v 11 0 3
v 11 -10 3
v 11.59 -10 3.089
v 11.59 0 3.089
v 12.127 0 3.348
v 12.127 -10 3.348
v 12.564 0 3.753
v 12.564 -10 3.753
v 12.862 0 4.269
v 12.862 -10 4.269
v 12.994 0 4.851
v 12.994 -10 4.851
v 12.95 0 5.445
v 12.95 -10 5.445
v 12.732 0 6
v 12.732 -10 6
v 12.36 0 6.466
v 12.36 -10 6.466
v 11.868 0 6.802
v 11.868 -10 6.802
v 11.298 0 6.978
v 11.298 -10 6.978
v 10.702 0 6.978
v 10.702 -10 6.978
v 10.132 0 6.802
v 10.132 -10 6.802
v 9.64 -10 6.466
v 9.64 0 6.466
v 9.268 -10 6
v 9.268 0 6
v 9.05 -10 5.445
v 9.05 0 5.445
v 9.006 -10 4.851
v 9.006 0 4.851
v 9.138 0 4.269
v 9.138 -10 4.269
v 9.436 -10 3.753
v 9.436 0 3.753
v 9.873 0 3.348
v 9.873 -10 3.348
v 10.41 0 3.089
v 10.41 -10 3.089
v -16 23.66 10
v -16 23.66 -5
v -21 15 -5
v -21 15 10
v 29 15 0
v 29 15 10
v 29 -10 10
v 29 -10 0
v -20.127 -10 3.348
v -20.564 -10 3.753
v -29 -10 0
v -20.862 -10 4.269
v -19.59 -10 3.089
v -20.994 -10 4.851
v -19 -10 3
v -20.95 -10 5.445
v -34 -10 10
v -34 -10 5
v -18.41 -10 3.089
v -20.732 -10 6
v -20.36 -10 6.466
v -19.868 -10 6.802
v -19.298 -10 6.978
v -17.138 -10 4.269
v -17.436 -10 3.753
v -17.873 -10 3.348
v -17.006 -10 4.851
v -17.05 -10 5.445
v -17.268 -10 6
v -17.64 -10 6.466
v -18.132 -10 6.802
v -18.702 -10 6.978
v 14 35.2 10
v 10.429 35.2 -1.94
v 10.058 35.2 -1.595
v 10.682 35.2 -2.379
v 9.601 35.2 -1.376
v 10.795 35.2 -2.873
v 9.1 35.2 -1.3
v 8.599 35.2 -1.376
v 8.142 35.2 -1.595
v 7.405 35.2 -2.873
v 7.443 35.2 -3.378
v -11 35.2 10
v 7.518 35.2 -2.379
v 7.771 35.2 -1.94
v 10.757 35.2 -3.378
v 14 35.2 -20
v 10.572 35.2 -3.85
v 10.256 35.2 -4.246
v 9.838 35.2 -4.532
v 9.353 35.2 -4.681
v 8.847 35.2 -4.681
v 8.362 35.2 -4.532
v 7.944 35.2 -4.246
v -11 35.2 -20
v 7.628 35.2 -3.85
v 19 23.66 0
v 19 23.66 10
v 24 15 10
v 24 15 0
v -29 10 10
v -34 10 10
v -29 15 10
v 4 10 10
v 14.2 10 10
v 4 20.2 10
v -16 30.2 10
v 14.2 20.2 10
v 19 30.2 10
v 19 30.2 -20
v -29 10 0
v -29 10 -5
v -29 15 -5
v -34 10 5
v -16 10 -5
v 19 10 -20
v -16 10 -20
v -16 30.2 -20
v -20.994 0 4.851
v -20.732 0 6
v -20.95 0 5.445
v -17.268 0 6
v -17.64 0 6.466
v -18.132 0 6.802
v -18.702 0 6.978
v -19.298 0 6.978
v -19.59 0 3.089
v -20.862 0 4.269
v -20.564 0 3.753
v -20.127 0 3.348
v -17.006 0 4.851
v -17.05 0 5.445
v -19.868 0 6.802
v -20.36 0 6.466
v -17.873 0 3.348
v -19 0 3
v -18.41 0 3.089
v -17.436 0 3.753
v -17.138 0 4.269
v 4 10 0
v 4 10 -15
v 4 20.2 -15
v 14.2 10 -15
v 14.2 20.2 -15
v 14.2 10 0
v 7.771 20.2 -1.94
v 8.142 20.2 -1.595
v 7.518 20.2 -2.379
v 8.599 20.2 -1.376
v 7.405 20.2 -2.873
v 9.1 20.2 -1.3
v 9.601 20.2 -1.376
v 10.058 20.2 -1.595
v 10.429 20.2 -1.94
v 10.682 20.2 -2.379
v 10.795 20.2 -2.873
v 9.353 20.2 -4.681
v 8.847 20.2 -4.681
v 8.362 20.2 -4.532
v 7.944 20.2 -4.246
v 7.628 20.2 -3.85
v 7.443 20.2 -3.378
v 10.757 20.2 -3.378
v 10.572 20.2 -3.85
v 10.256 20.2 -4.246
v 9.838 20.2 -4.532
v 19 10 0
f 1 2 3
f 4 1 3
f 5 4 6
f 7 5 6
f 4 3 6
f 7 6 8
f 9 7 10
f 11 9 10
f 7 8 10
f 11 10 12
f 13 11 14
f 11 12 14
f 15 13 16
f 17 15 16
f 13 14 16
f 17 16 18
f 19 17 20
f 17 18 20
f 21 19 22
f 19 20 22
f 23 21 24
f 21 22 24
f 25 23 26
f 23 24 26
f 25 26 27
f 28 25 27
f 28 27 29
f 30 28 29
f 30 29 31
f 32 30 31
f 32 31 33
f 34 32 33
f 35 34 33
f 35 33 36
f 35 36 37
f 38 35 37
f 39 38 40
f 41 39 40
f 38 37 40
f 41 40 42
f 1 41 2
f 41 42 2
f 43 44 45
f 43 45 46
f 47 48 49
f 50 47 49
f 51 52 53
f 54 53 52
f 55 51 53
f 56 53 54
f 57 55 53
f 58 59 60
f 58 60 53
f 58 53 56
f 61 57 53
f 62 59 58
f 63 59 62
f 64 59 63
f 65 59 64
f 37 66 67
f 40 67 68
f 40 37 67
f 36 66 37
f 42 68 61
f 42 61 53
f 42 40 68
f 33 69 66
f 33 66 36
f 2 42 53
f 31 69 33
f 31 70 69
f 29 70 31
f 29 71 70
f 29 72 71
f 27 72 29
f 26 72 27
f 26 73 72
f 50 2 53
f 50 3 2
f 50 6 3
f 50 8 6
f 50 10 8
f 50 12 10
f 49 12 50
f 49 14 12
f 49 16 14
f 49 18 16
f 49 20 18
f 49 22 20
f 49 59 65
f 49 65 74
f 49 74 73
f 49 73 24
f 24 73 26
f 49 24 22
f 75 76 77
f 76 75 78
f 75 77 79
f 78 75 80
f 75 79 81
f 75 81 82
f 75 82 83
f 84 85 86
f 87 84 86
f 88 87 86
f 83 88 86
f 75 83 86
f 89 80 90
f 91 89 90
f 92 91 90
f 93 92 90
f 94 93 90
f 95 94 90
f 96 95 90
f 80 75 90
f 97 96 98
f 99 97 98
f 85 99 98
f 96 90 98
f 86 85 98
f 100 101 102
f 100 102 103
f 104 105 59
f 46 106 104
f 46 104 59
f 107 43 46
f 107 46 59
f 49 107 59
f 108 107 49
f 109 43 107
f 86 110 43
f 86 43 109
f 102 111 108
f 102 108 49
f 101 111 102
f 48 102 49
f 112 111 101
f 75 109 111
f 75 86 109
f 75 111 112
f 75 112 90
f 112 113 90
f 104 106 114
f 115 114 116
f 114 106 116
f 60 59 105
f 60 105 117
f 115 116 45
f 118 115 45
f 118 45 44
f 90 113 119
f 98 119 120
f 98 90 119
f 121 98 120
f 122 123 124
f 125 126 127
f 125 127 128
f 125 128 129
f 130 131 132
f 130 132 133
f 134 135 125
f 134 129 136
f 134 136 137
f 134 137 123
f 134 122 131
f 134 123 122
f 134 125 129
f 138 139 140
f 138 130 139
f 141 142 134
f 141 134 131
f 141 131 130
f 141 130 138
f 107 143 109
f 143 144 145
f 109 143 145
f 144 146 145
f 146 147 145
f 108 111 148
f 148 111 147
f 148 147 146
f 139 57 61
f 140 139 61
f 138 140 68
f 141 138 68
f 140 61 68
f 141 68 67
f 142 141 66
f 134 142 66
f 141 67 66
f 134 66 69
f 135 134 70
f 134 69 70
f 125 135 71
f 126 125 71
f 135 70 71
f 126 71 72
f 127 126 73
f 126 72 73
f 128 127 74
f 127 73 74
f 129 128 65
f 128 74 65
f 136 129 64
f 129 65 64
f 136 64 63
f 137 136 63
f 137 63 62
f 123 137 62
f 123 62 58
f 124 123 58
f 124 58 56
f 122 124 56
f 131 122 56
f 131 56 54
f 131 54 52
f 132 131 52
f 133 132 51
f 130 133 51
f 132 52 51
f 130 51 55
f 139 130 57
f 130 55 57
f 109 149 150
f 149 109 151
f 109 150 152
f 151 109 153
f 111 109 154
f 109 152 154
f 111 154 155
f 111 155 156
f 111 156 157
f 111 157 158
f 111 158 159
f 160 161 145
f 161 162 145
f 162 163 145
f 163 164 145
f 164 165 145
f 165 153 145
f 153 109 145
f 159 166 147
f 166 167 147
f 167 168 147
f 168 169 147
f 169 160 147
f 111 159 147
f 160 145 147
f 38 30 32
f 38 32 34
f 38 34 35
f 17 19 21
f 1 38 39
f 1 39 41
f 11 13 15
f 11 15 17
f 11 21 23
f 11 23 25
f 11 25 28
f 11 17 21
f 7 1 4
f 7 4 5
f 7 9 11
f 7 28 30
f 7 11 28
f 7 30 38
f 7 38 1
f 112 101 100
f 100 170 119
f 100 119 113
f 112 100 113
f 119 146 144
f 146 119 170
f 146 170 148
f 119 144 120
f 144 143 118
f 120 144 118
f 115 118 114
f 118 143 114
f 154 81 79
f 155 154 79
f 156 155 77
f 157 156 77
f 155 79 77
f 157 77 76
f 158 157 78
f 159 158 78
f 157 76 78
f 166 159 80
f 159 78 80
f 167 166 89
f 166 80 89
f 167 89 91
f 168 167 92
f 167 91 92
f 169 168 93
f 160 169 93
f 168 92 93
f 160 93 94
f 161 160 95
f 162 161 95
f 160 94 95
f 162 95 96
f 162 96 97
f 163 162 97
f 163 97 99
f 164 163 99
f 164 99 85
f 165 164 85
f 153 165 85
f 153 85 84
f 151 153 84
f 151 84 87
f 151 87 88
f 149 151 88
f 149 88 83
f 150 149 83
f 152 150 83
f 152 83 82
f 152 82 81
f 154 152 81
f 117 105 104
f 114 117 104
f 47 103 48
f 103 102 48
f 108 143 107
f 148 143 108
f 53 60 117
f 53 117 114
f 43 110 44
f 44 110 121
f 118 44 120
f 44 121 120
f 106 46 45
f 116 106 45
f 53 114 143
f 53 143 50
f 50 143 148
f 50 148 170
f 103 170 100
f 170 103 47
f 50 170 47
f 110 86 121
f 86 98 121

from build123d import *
from OCP.BRepFilletAPI import BRepFilletAPI_MakeChamfer

# Parameters (mm, degrees)
SZKIC1_W                        = 58
SZKIC1_H                        = 20
DODANIE_WYCI_GNI_CIE1_DEPTH     = 5
SZKIC2_W                        = 15
SZKIC2_H                        = 5
DODANIE_WYCI_GNI_CIE2_DEPTH     = 58
DODANIE_WYCI_GNI_CIE3_DEPTH     = 20
DODANIE_WYCI_GNI_CIE4_DEPTH     = 10
WYTNIJ_WYCI_GNI_CIE2_DEPTH      = 50.950375374
WYTNIJ_WYCI_GNI_CIE2_DEPTH_BACK = 50.950375374
SZKIC6_W                        = 58
SZKIC6_H                        = 5
DODANIE_WYCI_GNI_CIE5_DEPTH     = 20
SZKIC7_R                        = 2
WYTNIJ_WYCI_GNI_CIE3_DEPTH      = 10
DODANIE_WYCI_GNI_CIE8_DEPTH     = 10
SZKIC11_W                       = 10.2
SZKIC11_H                       = 10.2
DODANIE_WYCI_GNI_CIE9_DEPTH     = 5
SFAZOWANIE2_SIZE                = 5
SZKIC12_W                       = 10
SZKIC12_H                       = 20
WYTNIJ_WYCI_GNI_CIE4_DEPTH      = 10
SZKIC13_R                       = 1.7
WYTNIJ_WYCI_GNI_CIE5_DEPTH      = 60.991999467
DODANIE_WYCI_GNI_CIE11_DEPTH    = 5
SFAZOWANIE6_SIZE                = 5
SFAZOWANIE6_SIZE2               = 8.660254038


with BuildPart() as part:
    # Szkic1 → Dodanie-wyciągnięcie1 (new body)
    with BuildSketch(Plane.XY):
        Rectangle(SZKIC1_W, SZKIC1_H)
    extrude(amount=DODANIE_WYCI_GNI_CIE1_DEPTH)

    # Szkic2 → Dodanie-wyciągnięcie2 (add)
    with BuildSketch(Plane(origin=(29, 0, 0), x_dir=(0, 0, -1), z_dir=(1, 0, 0))):
        with Locations((-2.5, 12.5)):
            Rectangle(SZKIC2_W, SZKIC2_H)
    extrude(amount=-DODANIE_WYCI_GNI_CIE2_DEPTH)

    # Szkic3 → Dodanie-wyciągnięcie3 (add)
    with BuildSketch(Plane.XZ.offset(10)):
        Polygon((-34, 5), (-29, 0), (-29, 5), (-24, 5), (-29, 10), (-34, 10), align=None)
    extrude(amount=-DODANIE_WYCI_GNI_CIE3_DEPTH)

    # Szkic5 → Dodanie-wyciągnięcie4 (add)
    with BuildSketch(Plane.XY.offset(5)):
        Polygon((14.2, 20.2), (14.2, 10), (19, 10), (19, 35.2), (-16, 35.2), (-16, 10), (4, 10), (4, 20.2), align=None)
    extrude(amount=-DODANIE_WYCI_GNI_CIE4_DEPTH)

    # Szkic5<3> → Wytnij-wyciągnięcie2 (cut, two sides: drawn at the far end of the back side and taken through both)
    with BuildSketch(Plane.XY.offset(5).offset(-WYTNIJ_WYCI_GNI_CIE2_DEPTH_BACK)):
        Polygon((4, 10), (14.2, 10), (14.2, 15), (14.2, 20.2), (4, 20.2), (4, 15), align=None)
    extrude(amount=WYTNIJ_WYCI_GNI_CIE2_DEPTH + WYTNIJ_WYCI_GNI_CIE2_DEPTH_BACK, mode=Mode.SUBTRACT)

    # Szkic6 → Dodanie-wyciągnięcie5 (add)
    with BuildSketch(Plane(origin=(0, 10, 0), x_dir=(1, 0, 0), z_dir=(0, 1, 0))):
        with Locations((0, -7.5)):
            Rectangle(SZKIC6_W, SZKIC6_H)
    extrude(amount=-DODANIE_WYCI_GNI_CIE5_DEPTH)

    # Szkic7 → Wytnij-wyciągnięcie3 (cut)
    with BuildSketch(Plane.XZ.offset(10)):
        with Locations(Location((-19, 5, 0), (0, 0, 270))):
            Circle(SZKIC7_R)
        with Locations(Location((11, 5, 0), (0, 0, 270))):
            Circle(SZKIC7_R)
    extrude(amount=-WYTNIJ_WYCI_GNI_CIE3_DEPTH, mode=Mode.SUBTRACT)

    # Szkic10 → Dodanie-wyciągnięcie8 (add)
    with BuildSketch(Plane(origin=(0, 0, -5), x_dir=(-1, 0, 0), z_dir=(0, 0, -1))):
        Polygon((16, 10), (16, 15), (16, 35.2), (-19, 35.2), (-19, 15), (-29, 15), (-29, 10), (-14.2, 10), (-14.2, 20.2), (-4, 20.2), (-4, 10), align=None)
    extrude(amount=DODANIE_WYCI_GNI_CIE8_DEPTH)

    # Szkic11 → Dodanie-wyciągnięcie9 (add)
    with BuildSketch(Plane(origin=(0, 0, -15), x_dir=(-1, 0, 0), z_dir=(0, 0, -1))):
        with Locations((-9.1, 15.1)):
            Rectangle(SZKIC11_W, SZKIC11_H)
        Polygon((-29, 10), (-14.2, 10), (-14.2, 20.2), (-4, 20.2), (-4, 10), (16, 10), (16, 35.2), (-19, 35.2), (-19, 15), (-29, 15), align=None)
    extrude(amount=DODANIE_WYCI_GNI_CIE9_DEPTH)

    # Sfazowanie2
    sfazowanie2_edges = [part.edges().sort_by_distance(p)[0] for p in [
        (-16, 35.2, -7.5),
        (19, 35.2, -7.5),
    ]]
    chamfer(sfazowanie2_edges, length=SFAZOWANIE2_SIZE)

    # Szkic12 → Wytnij-wyciągnięcie4 (cut)
    with BuildSketch(Plane.XZ.offset(-10)):
        with Locations((24, -10)):
            Rectangle(SZKIC12_W, SZKIC12_H)
    extrude(amount=-WYTNIJ_WYCI_GNI_CIE4_DEPTH, mode=Mode.SUBTRACT)

    # Szkic13 → Wytnij-wyciągnięcie5 (cut, through all)
    with BuildSketch(Plane(origin=(0, 35.2, 0), x_dir=(1, 0, 0), z_dir=(0, 1, 0))):
        with Locations(Location((9.1, 3, 0), (0, 0, 270))):
            Circle(SZKIC13_R)
    extrude(amount=-WYTNIJ_WYCI_GNI_CIE5_DEPTH, mode=Mode.SUBTRACT)

    # Szkic15 → Dodanie-wyciągnięcie11 (add)
    with BuildSketch(Plane.XY.offset(5)):
        Polygon((19, 15), (19, 30.2), (14, 35.2), (-11, 35.2), (-16, 30.2), (-16, 15), (4, 15), (4, 20.2), (14.2, 20.2), (14.2, 15), align=None)
    extrude(amount=DODANIE_WYCI_GNI_CIE11_DEPTH)

    # Sfazowanie6: one chamfer whose edges measure the first distance from different faces: ONE call of the kernel's chamfer builder (chamfer() names one face for all edges)
    sfazowanie6_edges_1 = [part.edges().sort_by_distance(p)[0] for p in [
        (-16, 15, 2.5),
    ]]
    sfazowanie6_side_1 = [part.faces().sort_by_distance(p)[0] for p in [
        (-22.5, 15, 2.5),
    ]]
    sfazowanie6_edges_2 = [part.edges().sort_by_distance(p)[0] for p in [
        (19, 15, 5),
    ]]
    sfazowanie6_side_2 = [part.faces().sort_by_distance(p)[0] for p in [
        (24, 15, 5),
    ]]
    sfazowanie6 = BRepFilletAPI_MakeChamfer(part.part.solid().wrapped)
    for e in sfazowanie6_edges_1:
        sfazowanie6.Add(SFAZOWANIE6_SIZE, SFAZOWANIE6_SIZE2, e.wrapped, sfazowanie6_side_1[0].wrapped)  # the first distance lies on this face
    for e in sfazowanie6_edges_2:
        sfazowanie6.Add(SFAZOWANIE6_SIZE, SFAZOWANIE6_SIZE2, e.wrapped, sfazowanie6_side_2[0].wrapped)  # the first distance lies on this face
    add(Compound.cast(sfazowanie6.Shape()), mode=Mode.REPLACE)


solid = part.part
